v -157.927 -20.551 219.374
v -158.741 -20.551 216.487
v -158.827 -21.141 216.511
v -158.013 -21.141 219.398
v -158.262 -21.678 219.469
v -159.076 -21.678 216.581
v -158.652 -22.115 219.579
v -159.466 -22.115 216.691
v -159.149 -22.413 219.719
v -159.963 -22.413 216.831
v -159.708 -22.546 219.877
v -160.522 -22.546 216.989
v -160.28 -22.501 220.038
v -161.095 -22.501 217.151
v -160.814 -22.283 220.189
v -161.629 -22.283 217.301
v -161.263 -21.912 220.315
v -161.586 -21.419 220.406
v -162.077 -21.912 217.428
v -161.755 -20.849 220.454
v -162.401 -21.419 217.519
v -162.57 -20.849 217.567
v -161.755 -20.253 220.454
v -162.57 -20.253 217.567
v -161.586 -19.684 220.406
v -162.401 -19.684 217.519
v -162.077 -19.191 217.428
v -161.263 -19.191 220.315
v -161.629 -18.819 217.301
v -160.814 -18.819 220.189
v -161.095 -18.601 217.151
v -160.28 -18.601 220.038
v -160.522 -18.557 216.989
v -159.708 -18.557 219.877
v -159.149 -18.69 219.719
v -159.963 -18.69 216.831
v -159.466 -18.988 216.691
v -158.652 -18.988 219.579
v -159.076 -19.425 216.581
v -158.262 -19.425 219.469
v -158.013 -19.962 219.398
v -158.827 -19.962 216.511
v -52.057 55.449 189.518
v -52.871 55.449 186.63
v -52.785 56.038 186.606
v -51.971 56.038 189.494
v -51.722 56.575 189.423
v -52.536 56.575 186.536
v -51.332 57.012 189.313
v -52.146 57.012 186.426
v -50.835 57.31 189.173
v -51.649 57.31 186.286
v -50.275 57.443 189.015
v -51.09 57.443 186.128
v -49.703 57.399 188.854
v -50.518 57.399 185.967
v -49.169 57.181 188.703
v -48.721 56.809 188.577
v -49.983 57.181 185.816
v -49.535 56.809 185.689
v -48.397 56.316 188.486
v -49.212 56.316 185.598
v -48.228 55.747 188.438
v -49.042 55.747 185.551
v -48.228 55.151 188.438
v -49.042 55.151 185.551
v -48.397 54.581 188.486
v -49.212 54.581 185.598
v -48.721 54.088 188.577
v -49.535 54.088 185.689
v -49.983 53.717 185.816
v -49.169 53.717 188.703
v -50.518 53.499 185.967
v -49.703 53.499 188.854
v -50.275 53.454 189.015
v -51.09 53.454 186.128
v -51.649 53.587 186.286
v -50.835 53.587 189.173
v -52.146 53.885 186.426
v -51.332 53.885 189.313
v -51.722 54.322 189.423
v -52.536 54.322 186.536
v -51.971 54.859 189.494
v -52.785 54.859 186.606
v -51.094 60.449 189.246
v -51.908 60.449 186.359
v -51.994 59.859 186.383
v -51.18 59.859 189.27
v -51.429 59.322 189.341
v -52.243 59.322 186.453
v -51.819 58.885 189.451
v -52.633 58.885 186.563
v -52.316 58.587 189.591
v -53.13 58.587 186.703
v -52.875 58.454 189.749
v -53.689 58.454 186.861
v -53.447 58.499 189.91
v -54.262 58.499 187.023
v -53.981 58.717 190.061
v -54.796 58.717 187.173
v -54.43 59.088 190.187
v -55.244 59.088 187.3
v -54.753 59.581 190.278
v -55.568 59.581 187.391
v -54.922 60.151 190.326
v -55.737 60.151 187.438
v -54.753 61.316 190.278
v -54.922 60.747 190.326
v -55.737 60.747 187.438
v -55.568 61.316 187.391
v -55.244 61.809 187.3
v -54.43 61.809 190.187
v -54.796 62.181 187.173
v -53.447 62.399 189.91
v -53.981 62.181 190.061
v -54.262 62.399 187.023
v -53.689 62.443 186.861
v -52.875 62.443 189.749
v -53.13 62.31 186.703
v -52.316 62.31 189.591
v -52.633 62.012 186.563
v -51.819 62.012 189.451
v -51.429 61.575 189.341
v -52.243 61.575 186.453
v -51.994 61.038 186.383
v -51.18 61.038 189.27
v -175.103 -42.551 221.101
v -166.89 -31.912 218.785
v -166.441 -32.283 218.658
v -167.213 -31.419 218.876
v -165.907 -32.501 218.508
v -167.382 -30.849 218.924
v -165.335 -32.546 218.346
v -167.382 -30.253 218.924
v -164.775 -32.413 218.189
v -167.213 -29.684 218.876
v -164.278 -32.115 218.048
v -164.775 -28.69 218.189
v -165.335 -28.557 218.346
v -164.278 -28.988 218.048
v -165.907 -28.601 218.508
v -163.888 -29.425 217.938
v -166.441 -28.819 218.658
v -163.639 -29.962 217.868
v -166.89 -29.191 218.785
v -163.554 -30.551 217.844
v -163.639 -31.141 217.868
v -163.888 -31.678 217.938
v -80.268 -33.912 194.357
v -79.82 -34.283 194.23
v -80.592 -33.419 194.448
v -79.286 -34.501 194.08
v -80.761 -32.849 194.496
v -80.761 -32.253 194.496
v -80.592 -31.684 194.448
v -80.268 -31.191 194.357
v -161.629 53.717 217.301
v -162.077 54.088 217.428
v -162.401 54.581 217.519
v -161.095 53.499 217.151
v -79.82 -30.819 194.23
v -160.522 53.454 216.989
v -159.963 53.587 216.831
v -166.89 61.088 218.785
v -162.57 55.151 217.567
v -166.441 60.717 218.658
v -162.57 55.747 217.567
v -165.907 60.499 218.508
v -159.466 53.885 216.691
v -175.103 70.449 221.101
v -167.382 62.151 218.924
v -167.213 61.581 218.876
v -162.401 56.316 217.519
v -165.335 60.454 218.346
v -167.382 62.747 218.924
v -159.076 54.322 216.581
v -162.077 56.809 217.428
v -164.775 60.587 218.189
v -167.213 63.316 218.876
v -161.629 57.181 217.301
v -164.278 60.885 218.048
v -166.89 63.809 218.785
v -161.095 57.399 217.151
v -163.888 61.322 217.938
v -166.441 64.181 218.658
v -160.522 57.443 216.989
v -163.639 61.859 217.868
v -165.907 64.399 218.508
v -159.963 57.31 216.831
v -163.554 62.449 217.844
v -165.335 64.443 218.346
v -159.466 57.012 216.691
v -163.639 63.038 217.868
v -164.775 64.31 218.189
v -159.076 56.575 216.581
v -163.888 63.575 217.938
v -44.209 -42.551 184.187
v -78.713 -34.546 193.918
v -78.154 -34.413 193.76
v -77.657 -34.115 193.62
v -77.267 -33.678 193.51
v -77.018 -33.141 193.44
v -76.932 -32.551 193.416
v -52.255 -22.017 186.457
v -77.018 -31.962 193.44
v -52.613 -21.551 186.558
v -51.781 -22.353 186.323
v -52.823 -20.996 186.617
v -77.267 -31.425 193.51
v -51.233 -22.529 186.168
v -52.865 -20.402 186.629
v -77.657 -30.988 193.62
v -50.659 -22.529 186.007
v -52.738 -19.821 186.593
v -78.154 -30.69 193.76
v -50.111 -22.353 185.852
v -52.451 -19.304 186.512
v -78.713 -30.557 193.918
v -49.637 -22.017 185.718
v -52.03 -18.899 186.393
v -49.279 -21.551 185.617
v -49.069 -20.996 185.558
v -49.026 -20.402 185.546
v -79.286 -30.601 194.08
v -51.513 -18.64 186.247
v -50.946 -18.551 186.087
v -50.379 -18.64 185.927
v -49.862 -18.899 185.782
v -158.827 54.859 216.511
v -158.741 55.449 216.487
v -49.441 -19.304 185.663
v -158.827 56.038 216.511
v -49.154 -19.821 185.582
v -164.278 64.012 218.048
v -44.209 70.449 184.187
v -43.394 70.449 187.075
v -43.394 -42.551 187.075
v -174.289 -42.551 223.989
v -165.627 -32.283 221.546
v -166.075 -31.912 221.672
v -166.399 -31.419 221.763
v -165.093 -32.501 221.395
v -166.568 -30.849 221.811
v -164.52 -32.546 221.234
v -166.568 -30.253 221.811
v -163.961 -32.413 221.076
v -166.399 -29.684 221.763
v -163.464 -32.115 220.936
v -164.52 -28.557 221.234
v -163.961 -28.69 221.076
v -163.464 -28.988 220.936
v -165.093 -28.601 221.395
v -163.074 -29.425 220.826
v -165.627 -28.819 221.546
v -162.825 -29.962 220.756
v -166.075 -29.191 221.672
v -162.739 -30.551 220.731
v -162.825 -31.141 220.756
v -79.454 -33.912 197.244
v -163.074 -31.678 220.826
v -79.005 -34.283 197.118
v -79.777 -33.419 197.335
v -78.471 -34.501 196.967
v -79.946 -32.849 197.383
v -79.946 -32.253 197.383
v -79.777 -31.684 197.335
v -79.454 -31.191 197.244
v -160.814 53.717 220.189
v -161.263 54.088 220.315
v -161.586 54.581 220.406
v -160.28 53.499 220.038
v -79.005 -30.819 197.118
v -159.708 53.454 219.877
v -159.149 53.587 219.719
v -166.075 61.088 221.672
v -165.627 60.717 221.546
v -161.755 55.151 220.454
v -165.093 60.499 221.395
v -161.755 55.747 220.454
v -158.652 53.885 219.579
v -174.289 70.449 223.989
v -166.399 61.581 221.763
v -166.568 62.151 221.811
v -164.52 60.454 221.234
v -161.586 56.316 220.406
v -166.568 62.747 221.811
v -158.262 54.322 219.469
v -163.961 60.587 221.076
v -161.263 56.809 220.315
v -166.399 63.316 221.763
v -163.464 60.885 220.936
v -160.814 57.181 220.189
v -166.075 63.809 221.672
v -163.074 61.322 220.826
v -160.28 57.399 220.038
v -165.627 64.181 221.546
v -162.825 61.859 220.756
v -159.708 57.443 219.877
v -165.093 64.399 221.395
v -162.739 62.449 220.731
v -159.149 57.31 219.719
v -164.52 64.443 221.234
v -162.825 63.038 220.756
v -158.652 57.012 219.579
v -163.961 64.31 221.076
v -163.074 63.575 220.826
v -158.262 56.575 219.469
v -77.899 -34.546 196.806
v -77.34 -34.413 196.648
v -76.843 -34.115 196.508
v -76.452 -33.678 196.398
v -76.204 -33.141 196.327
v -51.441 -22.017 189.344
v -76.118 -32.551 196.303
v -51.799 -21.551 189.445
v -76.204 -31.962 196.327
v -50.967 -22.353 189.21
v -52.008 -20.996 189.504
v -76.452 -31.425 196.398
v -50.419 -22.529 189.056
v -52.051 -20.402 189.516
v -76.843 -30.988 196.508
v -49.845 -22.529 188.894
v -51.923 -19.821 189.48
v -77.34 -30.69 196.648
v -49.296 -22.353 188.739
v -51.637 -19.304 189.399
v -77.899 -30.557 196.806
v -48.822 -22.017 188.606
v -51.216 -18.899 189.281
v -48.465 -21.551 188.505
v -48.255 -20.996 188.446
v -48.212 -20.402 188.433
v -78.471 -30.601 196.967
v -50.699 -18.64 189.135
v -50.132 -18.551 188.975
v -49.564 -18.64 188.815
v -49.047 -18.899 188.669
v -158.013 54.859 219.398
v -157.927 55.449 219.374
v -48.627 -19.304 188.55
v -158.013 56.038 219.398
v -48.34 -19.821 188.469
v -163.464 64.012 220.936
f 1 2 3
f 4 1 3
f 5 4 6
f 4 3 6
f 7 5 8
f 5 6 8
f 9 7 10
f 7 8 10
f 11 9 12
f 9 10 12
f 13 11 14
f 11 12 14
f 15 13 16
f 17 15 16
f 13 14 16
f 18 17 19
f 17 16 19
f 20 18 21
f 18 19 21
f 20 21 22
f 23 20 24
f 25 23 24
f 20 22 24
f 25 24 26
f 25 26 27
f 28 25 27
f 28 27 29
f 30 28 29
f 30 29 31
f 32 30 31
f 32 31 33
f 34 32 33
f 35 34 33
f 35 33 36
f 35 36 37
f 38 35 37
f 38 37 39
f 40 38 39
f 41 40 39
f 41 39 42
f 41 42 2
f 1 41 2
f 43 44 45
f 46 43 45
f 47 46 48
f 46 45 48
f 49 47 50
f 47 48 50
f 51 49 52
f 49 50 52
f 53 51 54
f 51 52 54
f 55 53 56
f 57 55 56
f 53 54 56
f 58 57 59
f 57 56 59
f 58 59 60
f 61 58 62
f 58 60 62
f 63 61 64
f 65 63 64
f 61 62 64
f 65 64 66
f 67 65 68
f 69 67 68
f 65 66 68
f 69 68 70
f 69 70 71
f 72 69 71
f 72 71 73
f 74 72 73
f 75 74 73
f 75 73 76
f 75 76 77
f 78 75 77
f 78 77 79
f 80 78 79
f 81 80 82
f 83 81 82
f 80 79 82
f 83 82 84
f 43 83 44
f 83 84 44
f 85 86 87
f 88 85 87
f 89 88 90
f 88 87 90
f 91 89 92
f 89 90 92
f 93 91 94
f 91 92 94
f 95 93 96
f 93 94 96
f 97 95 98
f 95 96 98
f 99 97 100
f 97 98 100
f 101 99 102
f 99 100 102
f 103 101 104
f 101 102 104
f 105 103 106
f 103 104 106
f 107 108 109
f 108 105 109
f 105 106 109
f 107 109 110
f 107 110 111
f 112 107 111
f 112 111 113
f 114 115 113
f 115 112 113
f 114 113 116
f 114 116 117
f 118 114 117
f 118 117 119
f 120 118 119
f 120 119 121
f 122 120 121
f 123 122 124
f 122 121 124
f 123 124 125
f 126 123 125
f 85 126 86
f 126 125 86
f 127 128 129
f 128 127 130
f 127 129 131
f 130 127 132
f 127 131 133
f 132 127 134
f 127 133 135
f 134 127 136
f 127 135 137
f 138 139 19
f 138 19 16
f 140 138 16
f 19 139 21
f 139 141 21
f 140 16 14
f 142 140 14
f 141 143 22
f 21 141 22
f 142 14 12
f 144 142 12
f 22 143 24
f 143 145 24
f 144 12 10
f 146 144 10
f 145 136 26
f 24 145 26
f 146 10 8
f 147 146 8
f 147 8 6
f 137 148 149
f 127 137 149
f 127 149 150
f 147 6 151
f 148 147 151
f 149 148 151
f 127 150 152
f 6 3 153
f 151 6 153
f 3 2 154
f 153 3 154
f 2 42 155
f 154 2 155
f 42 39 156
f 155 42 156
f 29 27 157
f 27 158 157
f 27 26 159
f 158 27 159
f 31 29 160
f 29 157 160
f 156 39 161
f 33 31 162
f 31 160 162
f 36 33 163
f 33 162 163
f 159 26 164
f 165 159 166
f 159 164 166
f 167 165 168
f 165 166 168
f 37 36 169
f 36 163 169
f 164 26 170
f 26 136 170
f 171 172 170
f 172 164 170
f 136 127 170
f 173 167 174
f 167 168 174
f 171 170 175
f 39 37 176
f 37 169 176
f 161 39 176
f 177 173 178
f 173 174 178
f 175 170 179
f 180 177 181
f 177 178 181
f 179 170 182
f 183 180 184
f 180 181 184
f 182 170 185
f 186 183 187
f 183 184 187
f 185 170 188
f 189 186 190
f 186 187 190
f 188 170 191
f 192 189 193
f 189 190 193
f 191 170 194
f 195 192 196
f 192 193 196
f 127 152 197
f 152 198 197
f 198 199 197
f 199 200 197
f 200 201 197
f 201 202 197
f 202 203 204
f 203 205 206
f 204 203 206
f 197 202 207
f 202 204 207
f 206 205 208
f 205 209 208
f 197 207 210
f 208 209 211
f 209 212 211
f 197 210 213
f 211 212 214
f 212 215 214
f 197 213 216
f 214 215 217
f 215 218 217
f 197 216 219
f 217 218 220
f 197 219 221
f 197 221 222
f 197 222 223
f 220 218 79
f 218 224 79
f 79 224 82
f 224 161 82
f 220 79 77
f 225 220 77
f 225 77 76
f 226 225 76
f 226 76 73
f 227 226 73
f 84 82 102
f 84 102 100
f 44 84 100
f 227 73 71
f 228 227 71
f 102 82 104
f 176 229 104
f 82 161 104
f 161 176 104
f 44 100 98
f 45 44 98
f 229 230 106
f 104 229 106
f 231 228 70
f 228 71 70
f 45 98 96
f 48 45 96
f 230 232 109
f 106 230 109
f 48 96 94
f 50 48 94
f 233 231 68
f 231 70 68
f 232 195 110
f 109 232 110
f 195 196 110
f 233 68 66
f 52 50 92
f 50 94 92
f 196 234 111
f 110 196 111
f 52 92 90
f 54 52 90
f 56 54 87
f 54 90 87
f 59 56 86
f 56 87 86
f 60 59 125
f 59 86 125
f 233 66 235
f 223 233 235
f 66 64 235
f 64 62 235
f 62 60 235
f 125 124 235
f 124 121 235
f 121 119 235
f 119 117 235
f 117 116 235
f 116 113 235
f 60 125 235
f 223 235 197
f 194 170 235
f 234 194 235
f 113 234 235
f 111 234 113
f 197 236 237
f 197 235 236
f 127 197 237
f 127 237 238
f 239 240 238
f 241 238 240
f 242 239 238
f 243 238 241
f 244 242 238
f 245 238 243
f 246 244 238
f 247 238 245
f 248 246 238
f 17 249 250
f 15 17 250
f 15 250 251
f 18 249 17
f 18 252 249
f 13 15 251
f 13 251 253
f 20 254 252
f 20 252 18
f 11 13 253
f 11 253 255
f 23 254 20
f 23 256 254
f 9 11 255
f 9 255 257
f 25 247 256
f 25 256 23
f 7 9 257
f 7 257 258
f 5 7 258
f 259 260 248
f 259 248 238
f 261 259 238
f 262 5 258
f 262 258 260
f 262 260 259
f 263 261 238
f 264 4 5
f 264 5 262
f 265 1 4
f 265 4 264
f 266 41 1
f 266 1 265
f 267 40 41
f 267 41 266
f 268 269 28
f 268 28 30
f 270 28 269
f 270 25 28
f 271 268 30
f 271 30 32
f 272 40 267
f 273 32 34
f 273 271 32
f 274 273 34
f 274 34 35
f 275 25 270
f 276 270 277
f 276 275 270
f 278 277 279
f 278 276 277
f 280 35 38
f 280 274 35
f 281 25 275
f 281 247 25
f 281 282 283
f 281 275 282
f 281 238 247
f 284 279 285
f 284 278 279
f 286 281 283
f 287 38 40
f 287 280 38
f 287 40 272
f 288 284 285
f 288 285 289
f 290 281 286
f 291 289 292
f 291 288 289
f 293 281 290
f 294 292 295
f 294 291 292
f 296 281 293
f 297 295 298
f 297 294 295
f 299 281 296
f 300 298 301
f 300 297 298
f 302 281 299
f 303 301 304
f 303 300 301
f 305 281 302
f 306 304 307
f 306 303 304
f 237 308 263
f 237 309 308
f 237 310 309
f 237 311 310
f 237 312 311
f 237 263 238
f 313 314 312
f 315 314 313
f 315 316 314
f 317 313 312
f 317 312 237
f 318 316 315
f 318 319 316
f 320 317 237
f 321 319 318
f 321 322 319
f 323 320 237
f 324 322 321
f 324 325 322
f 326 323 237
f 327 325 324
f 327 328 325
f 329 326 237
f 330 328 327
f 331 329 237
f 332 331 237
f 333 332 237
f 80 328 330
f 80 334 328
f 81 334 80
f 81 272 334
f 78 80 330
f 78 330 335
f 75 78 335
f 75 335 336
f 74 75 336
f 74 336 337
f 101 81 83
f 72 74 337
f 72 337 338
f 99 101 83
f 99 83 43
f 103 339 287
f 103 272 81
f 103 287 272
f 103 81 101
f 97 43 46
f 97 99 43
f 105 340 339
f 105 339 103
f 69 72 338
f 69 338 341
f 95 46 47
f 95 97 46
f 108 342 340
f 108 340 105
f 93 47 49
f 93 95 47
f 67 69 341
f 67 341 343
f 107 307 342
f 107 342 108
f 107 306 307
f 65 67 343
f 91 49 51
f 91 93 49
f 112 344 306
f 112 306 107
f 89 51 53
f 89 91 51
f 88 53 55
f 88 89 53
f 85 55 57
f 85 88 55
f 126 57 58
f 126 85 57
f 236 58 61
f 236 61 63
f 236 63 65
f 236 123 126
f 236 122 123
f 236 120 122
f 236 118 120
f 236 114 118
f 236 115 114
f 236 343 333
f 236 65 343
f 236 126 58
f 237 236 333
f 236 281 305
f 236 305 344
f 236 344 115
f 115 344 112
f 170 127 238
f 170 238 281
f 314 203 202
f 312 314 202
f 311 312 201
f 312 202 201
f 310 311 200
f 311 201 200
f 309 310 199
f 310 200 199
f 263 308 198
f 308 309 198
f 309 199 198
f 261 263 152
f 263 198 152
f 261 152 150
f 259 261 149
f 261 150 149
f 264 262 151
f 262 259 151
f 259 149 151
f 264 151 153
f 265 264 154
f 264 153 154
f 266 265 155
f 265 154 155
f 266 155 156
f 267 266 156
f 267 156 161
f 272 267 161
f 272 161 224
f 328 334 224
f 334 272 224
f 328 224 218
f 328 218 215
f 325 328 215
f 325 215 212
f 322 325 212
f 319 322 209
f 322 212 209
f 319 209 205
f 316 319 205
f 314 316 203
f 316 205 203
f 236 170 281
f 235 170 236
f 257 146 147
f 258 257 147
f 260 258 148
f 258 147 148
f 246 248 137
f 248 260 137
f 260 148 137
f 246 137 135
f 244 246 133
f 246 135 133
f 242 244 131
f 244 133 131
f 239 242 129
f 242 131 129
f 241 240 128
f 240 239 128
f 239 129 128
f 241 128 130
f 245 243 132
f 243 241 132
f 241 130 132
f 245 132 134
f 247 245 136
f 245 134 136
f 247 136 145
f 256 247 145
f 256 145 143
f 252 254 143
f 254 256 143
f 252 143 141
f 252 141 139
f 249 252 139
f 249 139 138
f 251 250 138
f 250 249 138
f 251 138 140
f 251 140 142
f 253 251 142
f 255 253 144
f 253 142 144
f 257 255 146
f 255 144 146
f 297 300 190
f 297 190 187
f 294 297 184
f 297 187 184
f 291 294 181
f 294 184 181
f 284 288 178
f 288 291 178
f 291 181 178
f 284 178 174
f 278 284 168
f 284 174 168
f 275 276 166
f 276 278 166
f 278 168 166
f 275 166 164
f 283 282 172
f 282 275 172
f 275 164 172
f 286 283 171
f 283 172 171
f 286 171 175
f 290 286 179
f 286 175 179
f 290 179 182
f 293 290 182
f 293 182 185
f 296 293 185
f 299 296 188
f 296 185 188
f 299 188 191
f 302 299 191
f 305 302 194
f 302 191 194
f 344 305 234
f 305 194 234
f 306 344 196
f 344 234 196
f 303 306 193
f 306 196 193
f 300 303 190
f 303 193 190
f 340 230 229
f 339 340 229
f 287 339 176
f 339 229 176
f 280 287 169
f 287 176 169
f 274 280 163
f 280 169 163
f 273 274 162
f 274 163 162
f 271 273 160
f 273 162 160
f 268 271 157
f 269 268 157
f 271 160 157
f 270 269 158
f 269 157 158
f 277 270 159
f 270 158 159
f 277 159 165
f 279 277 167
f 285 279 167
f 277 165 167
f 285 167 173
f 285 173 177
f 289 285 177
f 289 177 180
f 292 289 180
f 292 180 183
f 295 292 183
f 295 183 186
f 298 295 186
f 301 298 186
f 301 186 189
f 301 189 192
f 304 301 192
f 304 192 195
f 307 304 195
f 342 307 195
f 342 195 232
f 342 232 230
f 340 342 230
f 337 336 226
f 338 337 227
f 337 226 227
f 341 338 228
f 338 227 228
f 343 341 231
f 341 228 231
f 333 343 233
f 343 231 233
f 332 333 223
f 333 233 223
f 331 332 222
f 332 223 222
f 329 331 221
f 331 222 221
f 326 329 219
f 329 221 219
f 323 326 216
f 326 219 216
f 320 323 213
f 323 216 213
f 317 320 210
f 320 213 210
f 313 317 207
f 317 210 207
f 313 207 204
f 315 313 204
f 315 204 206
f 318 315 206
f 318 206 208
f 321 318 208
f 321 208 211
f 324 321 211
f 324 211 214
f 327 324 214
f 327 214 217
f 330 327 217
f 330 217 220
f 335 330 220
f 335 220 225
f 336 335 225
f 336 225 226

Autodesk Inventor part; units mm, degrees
ref_plane "YZ Plane" through (0, 0, 0) normal (1, 0, 0) x (0, 1, 0)
ref_plane "XZ Plane" through (0, 0, 0) normal (0, 1, 0) x (-1, 0, 0)
ref_plane "XY Plane" through (0, 0, 0) normal (0, 0, 1) x (1, 0, 0)
ref_plane "Work Plane1" through (208.4454, -9.6874, 112.9362) normal (0.2714244, 0, 0.9624598) x (0.9624598, 0, -0.2714244)
sketch "Sketch1" plane through (208.4454, -9.6874, 112.9362) normal (0.2714244, 0, 0.9624598) x (0.9624598, 0, -0.2714244)
  line L0 (-398.5087, 80.1361) -> (-262.5087, 80.1361)
  line L1 (-262.5087, 80.1361) -> (-262.5087, -32.8639)
  line L2 (-262.5087, -32.8639) -> (-398.5087, -32.8639)
  line L3 (-398.5087, -32.8639) -> (-398.5087, 80.1361)
  circle A0 centre (-388.5087, 72.1361) radius 2
  circle A1 centre (-272.5087, 70.1361) radius 2
  circle A2 centre (-298.5087, -22.8639) radius 2
  circle A3 centre (-388.5087, -20.8639) radius 2
  line L4 (-383.5087, -10.8639) -> (-269.5087, -10.8639)
  line L5 (-269.5087, -10.8639) -> (-269.5087, 65.1361)
  line L6 (-269.5087, 65.1361) -> (-383.5087, 65.1361)
  line L7 (-383.5087, 65.1361) -> (-383.5087, -10.8639)
  circle A4 centre (-383.5087, -10.8639) radius 2
  circle A5 centre (-269.5087, -10.8639) radius 2
  circle A6 centre (-269.5087, 65.1361) radius 2
  circle A7 centre (-383.5087, 65.1361) radius 2
  point P0 (-169.9666, 9.6874)
  dimension "d0" = 136
  dimension "d1" = 113
  dimension "d2" = 4
  dimension "d3" = 4
  dimension "d4" = 4
  dimension "d5" = 4
  dimension "d6" = 116
  dimension "d7" = 93
  dimension "d8" = 93
  dimension "d9" = 90
  dimension "d10" = 10
  dimension "d11" = 10
  dimension "d12" = 0
  dimension "d13" = 114
  dimension "d14" = 76
  dimension "d15" = 15
  dimension "d16" = 15
  dimension "d17" = 4
  dimension "d18" = 4
  dimension "d19" = 4
  dimension "d20" = 4
extrude "Extrusion1" add sketch "Sketch1" along normal blind 3 contours L0 L1 L2 L3 | L7 A4 L4 | A4 L7 A7 L6 A6 L5 A5 L4 | A5 L5 L4 | L7 L6 A7 | A6 L6 L5 picked at (-383.0711, -9.6133) picked at (-269.9463, -9.6133) picked at (-383.0711, 63.8855) picked at (-269.9463, 63.8855)
extrude "Extrusion2" cut sketch "Sketch1" along normal through all contours L7 A4 L4 | L4 A4 L7 | A5 L5 L4 | L4 L5 A5 | A7 L6 L7 | L7 L6 A7 | A6 L6 L5 | L5 L6 A6
equation "\"d3\" = d2"
equation "\"d4\" = d2"
equation "\"d5\" = d4"
equation "\"d17\" = d4"
equation "\"d18\" = d4"
equation "\"d19\" = d17"
equation "\"d20\" = d18"
properties part number "SpartanLap"
